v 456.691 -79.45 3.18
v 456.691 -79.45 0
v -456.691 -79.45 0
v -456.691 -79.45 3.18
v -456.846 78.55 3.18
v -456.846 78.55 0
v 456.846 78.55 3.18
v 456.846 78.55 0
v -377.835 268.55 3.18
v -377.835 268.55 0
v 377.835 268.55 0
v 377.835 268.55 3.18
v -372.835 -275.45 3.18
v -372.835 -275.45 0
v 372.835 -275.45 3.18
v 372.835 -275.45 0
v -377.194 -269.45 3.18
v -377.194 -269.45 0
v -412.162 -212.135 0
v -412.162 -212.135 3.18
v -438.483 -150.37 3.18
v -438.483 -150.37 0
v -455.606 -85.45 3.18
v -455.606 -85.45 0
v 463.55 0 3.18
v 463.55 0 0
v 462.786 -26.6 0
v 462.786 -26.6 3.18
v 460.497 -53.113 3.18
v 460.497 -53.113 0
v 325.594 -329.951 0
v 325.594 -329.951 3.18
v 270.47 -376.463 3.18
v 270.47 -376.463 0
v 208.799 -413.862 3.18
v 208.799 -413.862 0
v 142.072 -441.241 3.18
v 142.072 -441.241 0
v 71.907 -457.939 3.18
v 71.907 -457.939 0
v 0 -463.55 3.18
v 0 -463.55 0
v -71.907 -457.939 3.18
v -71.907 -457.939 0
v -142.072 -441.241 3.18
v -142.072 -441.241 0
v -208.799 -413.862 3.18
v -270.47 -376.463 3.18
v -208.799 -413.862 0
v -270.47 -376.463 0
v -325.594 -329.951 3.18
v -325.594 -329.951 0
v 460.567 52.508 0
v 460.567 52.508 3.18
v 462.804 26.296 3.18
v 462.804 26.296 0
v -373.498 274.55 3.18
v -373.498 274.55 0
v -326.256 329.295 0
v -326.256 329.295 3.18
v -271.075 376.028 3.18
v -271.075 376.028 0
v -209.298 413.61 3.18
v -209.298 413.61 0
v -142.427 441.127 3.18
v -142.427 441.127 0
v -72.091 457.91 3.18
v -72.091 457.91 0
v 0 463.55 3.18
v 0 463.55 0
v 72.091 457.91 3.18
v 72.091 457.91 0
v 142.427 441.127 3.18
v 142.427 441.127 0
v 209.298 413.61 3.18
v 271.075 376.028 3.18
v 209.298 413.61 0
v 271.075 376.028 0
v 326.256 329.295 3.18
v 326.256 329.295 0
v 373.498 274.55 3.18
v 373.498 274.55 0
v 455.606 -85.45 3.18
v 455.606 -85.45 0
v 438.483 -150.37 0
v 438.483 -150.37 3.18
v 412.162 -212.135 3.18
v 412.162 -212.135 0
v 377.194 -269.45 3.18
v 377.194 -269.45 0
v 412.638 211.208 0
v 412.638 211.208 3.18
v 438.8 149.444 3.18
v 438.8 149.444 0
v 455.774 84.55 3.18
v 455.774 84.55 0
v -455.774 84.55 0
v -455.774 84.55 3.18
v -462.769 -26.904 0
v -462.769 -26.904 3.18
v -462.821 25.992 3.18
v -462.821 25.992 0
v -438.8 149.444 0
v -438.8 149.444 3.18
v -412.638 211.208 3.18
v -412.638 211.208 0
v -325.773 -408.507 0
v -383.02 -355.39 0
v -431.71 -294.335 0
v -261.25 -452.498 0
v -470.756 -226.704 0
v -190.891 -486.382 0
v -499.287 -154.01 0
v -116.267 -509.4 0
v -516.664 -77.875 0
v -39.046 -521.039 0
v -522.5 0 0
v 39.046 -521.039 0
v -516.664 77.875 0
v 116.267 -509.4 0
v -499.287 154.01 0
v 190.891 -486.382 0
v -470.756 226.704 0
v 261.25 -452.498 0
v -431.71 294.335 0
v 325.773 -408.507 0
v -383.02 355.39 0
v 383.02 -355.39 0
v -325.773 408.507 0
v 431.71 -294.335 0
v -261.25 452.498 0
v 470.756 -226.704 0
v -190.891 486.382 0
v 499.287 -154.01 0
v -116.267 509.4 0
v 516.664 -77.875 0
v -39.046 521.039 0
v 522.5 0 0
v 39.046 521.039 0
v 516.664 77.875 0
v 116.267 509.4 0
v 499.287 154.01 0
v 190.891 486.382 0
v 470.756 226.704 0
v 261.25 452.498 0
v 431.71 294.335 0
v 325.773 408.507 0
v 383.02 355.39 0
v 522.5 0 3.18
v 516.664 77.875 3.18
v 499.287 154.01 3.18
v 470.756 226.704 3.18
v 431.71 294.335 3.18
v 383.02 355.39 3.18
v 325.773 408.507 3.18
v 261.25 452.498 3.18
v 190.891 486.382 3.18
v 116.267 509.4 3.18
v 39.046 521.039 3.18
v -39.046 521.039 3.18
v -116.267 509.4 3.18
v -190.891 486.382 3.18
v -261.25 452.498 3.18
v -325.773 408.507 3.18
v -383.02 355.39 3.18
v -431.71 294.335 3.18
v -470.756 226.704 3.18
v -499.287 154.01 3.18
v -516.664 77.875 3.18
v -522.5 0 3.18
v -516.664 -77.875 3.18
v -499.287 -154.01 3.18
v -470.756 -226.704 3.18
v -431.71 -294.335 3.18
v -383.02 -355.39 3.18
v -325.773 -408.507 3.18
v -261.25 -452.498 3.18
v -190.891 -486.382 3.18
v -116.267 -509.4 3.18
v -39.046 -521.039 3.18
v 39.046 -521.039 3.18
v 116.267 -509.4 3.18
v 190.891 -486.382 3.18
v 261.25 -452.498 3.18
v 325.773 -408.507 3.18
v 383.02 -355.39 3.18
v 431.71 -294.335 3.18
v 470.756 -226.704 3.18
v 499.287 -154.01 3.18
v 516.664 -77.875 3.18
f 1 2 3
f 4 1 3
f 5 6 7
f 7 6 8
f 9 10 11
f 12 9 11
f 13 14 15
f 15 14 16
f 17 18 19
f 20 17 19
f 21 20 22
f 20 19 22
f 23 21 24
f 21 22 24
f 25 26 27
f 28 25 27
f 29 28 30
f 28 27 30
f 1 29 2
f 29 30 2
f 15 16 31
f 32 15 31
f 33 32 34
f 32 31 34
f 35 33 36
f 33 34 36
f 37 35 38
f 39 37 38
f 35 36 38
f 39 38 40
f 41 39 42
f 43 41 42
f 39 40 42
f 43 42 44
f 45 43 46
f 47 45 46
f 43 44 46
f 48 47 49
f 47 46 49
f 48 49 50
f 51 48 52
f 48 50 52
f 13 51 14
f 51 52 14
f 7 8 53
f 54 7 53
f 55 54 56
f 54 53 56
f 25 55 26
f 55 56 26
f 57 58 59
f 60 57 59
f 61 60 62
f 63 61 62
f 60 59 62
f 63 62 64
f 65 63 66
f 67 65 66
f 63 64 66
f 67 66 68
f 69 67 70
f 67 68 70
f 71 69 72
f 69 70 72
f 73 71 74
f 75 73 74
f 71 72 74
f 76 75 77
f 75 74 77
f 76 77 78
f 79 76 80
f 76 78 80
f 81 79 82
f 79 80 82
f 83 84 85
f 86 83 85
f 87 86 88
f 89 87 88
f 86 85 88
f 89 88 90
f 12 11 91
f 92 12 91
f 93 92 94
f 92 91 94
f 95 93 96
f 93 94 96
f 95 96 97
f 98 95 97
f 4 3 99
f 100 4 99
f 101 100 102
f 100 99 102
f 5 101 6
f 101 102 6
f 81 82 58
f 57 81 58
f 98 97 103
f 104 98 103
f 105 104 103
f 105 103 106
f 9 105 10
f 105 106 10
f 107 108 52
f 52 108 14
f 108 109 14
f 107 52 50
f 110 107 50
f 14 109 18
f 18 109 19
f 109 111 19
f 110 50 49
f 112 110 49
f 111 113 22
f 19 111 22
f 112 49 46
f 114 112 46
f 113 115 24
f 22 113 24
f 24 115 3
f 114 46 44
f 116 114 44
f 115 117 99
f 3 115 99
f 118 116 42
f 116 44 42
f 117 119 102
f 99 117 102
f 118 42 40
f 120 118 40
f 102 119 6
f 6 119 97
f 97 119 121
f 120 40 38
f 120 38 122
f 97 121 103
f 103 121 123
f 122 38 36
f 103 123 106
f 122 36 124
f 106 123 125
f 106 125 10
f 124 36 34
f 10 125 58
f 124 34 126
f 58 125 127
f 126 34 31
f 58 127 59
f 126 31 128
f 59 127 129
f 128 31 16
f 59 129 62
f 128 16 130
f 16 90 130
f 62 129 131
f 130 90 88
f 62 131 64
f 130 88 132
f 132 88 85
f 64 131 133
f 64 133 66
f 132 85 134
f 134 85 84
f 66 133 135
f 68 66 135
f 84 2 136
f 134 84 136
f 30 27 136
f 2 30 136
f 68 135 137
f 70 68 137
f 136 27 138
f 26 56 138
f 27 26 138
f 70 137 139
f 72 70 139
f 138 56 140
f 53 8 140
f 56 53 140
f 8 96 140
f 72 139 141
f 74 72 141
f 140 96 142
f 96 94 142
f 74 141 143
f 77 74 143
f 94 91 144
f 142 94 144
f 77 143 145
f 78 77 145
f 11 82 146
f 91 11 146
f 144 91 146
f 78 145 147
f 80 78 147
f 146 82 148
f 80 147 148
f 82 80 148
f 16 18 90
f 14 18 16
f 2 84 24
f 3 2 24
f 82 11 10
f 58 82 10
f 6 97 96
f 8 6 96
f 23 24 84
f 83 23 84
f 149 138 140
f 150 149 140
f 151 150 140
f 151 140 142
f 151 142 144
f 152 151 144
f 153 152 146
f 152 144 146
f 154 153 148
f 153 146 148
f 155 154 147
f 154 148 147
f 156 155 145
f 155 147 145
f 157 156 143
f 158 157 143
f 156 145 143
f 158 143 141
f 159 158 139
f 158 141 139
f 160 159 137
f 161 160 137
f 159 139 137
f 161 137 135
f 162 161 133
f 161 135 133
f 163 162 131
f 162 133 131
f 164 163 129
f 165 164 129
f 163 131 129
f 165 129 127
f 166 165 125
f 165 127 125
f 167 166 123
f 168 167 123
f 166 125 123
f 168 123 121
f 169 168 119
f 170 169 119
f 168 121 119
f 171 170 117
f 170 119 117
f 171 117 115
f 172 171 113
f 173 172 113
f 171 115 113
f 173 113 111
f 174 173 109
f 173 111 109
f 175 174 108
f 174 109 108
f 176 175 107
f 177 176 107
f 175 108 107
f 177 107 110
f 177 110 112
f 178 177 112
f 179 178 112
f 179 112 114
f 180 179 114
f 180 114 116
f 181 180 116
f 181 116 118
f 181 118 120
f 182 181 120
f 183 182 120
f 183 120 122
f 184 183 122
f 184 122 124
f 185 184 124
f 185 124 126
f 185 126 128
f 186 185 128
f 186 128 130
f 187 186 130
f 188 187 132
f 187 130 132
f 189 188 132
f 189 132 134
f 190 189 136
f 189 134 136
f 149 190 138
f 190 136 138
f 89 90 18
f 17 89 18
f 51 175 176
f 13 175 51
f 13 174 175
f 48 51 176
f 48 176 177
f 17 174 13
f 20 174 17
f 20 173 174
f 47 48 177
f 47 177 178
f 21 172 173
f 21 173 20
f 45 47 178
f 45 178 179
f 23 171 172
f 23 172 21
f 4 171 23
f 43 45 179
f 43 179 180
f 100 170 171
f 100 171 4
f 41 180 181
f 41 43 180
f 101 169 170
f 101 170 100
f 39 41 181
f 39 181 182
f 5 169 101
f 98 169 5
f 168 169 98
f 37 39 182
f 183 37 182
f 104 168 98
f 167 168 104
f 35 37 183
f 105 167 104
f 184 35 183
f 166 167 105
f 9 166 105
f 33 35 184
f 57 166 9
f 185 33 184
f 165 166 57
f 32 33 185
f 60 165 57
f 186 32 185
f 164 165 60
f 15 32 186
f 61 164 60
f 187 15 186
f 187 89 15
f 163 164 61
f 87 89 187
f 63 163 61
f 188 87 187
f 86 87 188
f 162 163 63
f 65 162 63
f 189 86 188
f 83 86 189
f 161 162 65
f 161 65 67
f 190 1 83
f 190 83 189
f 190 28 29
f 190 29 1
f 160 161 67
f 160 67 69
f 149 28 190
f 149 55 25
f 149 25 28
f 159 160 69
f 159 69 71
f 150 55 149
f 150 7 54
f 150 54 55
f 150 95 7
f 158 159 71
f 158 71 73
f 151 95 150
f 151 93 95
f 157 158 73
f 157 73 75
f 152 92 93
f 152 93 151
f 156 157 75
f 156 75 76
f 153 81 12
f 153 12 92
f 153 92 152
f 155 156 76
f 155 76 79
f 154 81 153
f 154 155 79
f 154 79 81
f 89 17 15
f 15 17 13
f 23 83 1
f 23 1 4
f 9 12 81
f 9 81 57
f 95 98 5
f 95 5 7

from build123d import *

# Parameters (mm, degrees)
F0_R     = 522.5
F1_DEPTH = 3.18


with BuildPart() as f1:
    # F0 (on Top) → F1 (new body)
    with BuildSketch(Plane.XY):
        Circle(F0_R)
        with BuildLine():
            ThreePointArc((456.846254, 78.55), (461.871023, 39.417771), (463.55, 0))
            ThreePointArc((463.55, 0), (461.831965, -39.872779), (456.690595, -79.45))
            ThreePointArc((456.690595, -79.45), (456.158203, -82.451783), (455.60608, -85.45))
            ThreePointArc((455.60608, -85.45), (426.442242, -181.729515), (377.193982, -269.45))
            ThreePointArc((377.193982, -269.45), (375.026465, -272.458718), (372.83495, -275.45))
            ThreePointArc((372.83495, -275.45), (0, -463.55), (-372.83495, -275.45))
            ThreePointArc((-372.83495, -275.45), (-375.026465, -272.458718), (-377.193982, -269.45))
            ThreePointArc((-377.193982, -269.45), (-426.442242, -181.729515), (-455.60608, -85.45))
            ThreePointArc((-455.60608, -85.45), (-456.158203, -82.451783), (-456.690595, -79.45))
            ThreePointArc((-456.690595, -79.45), (-463.549775, -0.456681), (-456.846254, 78.55))
            ThreePointArc((-456.846254, 78.55), (-456.319967, 81.551762), (-455.773957, 84.55))
            ThreePointArc((-455.773957, 84.55), (-426.837312, 180.799645), (-377.835282, 268.55))
            ThreePointArc((-377.835282, 268.55), (-375.678716, 271.558659), (-373.498193, 274.55))
            ThreePointArc((-373.498193, 274.55), (0, 463.55), (373.498193, 274.55))
            ThreePointArc((373.498193, 274.55), (375.678716, 271.558659), (377.835282, 268.55))
            ThreePointArc((377.835282, 268.55), (426.837312, 180.799645), (455.773957, 84.55))
            ThreePointArc((455.773957, 84.55), (456.319967, 81.551762), (456.846254, 78.55))
        make_face(mode=Mode.SUBTRACT)
        with BuildLine():
            Line((-377.835282, 268.55), (377.835282, 268.55))
            ThreePointArc((377.835282, 268.55), (375.678716, 271.558659), (373.498193, 274.55))
            Line((373.498193, 274.55), (-373.498193, 274.55))
            ThreePointArc((-373.498193, 274.55), (-375.678716, 271.558659), (-377.835282, 268.55))
        make_face()
        with BuildLine():
            Line((-456.846254, 78.55), (456.846254, 78.55))
            ThreePointArc((456.846254, 78.55), (456.319967, 81.551762), (455.773957, 84.55))
            Line((455.773957, 84.55), (-455.773957, 84.55))
            ThreePointArc((-455.773957, 84.55), (-456.319967, 81.551762), (-456.846254, 78.55))
        make_face()
        with BuildLine():
            ThreePointArc((455.60608, -85.45), (456.158203, -82.451783), (456.690595, -79.45))
            Line((456.690595, -79.45), (-456.690595, -79.45))
            ThreePointArc((-456.690595, -79.45), (-456.158203, -82.451783), (-455.60608, -85.45))
            Line((-455.60608, -85.45), (455.60608, -85.45))
        make_face()
        with BuildLine():
            ThreePointArc((372.83495, -275.45), (375.026465, -272.458718), (377.193982, -269.45))
            Line((377.193982, -269.45), (-377.193982, -269.45))
            ThreePointArc((-377.193982, -269.45), (-375.026465, -272.458718), (-372.83495, -275.45))
            Line((-372.83495, -275.45), (372.83495, -275.45))
        make_face()
    extrude(amount=F1_DEPTH)


solid = f1.part
